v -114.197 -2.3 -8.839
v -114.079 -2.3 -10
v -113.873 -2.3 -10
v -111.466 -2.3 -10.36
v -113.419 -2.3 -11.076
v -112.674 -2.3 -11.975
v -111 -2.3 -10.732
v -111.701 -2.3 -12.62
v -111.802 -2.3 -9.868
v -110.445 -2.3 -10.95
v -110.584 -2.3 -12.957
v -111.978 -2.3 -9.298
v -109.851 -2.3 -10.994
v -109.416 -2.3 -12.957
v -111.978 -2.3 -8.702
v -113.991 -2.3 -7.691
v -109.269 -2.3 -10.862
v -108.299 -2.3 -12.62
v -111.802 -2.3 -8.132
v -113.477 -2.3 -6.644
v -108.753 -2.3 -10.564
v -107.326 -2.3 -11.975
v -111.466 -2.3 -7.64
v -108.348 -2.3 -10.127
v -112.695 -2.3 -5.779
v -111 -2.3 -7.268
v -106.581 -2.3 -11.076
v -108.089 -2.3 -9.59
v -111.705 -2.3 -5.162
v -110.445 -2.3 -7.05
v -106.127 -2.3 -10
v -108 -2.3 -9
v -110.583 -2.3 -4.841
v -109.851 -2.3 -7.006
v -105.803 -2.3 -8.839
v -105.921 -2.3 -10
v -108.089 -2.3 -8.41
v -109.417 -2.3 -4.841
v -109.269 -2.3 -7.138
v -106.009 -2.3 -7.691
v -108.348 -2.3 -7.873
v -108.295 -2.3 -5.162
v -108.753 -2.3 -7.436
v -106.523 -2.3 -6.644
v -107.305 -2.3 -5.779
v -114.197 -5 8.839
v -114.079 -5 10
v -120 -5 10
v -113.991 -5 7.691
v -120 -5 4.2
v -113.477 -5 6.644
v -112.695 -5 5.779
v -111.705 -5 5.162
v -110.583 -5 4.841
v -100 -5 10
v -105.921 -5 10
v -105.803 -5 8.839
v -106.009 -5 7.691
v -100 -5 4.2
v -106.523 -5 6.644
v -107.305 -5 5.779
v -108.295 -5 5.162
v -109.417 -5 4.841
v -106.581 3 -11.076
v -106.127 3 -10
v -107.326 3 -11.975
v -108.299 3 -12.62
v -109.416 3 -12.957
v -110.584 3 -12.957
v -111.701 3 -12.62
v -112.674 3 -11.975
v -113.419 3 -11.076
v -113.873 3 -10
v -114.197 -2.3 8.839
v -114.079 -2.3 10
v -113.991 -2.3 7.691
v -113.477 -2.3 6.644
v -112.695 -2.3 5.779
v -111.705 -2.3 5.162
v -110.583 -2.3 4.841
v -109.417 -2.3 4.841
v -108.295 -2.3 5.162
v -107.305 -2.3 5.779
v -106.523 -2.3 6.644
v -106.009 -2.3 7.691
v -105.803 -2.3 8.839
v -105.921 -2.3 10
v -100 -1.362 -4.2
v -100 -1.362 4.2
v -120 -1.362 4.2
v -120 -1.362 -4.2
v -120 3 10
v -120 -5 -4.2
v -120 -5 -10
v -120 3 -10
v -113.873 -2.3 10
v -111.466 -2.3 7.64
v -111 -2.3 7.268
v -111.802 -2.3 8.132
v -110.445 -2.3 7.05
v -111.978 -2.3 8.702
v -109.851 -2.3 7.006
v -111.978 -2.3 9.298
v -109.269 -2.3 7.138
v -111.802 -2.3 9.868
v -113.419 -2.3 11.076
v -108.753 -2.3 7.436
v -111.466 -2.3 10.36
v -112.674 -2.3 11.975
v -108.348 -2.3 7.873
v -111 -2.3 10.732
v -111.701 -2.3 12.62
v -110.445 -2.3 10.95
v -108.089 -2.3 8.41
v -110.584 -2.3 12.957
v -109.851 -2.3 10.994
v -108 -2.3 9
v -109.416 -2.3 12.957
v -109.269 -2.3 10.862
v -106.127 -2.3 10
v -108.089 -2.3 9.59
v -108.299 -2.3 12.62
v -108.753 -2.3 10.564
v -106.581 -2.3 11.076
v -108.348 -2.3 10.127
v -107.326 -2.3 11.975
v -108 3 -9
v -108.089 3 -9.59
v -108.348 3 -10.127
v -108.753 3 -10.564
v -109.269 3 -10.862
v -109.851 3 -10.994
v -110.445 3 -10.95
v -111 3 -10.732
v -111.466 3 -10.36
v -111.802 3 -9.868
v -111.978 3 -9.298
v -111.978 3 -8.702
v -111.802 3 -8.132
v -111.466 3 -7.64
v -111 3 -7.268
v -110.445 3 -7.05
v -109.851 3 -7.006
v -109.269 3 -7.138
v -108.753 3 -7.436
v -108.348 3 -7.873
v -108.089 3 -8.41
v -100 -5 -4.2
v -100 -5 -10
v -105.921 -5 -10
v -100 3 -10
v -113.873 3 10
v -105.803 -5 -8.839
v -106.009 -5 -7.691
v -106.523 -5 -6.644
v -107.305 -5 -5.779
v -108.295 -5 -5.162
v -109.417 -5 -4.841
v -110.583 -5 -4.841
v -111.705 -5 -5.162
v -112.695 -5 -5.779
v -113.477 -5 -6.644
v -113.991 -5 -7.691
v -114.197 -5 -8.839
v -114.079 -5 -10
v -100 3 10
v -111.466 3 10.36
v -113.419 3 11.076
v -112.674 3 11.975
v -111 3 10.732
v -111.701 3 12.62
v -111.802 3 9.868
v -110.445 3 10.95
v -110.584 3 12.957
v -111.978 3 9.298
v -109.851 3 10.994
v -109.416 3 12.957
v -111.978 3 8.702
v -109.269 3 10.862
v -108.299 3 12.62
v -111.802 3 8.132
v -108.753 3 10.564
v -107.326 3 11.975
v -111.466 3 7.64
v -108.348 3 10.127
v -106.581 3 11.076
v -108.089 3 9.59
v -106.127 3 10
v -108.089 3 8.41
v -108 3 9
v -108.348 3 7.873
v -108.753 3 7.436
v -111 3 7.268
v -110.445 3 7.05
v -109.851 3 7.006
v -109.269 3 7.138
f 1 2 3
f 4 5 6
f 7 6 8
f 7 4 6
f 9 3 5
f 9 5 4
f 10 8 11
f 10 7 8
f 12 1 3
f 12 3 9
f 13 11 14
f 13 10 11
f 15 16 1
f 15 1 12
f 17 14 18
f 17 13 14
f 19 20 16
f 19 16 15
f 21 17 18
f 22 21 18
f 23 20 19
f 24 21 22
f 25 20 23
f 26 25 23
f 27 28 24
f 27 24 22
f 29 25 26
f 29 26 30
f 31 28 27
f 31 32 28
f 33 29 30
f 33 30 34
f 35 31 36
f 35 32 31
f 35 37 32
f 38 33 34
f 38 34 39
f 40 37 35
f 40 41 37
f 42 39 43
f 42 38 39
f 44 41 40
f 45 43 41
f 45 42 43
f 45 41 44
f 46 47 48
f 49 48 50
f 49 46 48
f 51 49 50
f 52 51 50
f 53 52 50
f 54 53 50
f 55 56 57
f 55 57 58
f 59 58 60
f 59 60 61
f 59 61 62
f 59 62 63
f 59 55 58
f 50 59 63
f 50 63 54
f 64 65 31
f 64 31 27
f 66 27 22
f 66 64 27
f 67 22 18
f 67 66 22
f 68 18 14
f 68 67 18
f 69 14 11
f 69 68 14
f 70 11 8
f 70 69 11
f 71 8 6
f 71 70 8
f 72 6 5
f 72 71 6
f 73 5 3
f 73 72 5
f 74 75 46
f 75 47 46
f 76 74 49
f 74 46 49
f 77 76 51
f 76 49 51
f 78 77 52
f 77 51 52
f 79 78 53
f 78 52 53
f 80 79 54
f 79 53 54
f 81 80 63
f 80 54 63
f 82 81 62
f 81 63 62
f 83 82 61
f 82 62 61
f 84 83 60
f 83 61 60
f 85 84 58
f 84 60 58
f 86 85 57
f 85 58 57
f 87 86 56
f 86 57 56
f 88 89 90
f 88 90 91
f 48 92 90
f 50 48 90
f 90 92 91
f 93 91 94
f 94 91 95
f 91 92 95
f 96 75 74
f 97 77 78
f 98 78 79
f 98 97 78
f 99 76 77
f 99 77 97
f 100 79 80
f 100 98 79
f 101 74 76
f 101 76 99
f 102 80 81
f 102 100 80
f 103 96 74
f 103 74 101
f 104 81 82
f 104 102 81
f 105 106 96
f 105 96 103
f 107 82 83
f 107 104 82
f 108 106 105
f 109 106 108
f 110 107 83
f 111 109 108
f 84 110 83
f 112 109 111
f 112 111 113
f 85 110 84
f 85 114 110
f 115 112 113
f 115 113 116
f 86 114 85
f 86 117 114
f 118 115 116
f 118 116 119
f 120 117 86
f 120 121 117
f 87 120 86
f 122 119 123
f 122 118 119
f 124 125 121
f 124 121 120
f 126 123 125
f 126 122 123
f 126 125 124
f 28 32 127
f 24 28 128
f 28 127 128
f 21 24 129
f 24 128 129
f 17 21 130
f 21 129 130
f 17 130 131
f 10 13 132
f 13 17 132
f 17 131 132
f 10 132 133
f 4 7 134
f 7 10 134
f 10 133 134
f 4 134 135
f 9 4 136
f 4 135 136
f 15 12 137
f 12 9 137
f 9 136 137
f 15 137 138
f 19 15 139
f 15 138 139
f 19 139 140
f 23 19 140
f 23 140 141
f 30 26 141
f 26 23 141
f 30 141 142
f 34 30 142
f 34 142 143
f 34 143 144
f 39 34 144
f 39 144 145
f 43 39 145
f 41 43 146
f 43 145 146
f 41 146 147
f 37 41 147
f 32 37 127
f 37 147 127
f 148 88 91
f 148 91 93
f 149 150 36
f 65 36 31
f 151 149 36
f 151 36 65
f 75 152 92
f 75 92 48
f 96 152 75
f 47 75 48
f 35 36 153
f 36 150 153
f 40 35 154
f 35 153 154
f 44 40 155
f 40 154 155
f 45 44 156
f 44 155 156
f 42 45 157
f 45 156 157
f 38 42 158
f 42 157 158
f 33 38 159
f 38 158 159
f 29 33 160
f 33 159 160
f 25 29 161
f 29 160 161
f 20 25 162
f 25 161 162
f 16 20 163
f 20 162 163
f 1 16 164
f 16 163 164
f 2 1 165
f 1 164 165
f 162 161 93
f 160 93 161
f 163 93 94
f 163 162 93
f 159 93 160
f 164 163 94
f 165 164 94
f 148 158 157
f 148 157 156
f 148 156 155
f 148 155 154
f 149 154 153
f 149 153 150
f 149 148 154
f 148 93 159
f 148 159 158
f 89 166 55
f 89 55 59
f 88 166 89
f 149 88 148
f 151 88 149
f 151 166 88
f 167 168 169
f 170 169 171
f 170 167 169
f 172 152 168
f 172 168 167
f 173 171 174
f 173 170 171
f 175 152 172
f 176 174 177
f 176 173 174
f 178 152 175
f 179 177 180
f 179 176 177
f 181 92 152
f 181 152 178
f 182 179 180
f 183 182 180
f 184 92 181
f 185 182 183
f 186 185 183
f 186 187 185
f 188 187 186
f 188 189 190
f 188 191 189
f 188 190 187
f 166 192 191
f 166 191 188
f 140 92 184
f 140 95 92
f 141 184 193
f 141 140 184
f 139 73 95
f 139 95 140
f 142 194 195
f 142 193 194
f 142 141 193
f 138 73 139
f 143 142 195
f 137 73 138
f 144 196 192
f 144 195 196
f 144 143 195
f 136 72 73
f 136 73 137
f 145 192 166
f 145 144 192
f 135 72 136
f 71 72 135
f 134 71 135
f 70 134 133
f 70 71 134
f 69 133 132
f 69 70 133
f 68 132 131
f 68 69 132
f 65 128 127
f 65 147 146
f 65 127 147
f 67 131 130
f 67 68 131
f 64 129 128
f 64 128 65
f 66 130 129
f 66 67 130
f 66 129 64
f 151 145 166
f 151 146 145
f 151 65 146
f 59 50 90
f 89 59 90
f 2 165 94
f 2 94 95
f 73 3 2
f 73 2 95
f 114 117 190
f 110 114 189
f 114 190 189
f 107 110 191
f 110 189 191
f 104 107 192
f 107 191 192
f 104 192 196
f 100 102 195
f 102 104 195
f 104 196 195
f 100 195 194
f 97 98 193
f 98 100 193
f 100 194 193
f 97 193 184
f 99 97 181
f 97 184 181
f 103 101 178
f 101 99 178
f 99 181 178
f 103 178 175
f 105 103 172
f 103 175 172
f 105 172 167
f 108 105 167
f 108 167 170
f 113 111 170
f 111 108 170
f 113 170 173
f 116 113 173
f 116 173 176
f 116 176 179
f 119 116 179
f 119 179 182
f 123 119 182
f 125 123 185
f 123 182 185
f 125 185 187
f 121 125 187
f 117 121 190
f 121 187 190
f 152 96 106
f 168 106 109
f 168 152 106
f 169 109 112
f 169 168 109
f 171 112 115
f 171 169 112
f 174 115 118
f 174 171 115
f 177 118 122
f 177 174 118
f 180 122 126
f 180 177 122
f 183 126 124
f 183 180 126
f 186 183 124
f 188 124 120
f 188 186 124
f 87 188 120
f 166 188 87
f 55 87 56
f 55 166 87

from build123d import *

# Parameters (mm, degrees)
EXTRUDE_1_DEPTH      = 10
EXTRUDE_1_DEPTH_BACK = 10
SKETCH_3_R           = 4
EXTRUDE_2_DEPTH      = 8
SKETCH_2_R           = 2
CUT_EXTRUDE_1_DEPTH  = 10
SKETCH_4_R           = 4.2
SKETCH_4_R_2         = 2
CUT_EXTRUDE_2_DEPTH  = 2.7


with BuildPart() as part:
    # Эскиз1 → Бобышка-Вытянуть1 (new body, two sides)
    with BuildSketch(Plane(origin=(-110, 0, 0), x_dir=(0, 0, -1), z_dir=(1, 0, 0))) as extrude_1_sk:
        Polygon((-4.2, -5), (-4.2, -1.3625), (4.2, -1.3625), (4.2, -5), (10, -5), (10, 3), (-10, 3), (-10, -5), align=None)
    extrude(amount=EXTRUDE_1_DEPTH)
    extrude(extrude_1_sk.sketch, amount=-EXTRUDE_1_DEPTH_BACK)

    # Эскиз3 → Бобышка-Вытянуть2 (add, through all)
    with BuildSketch(Plane(origin=(0, 3, 0), x_dir=(1, 0, 0), z_dir=(0, 1, 0))):
        with Locations((-110, -9)):
            Circle(SKETCH_3_R)
        with Locations((-110, 9)):
            Circle(SKETCH_3_R)
    extrude(amount=-EXTRUDE_2_DEPTH)

    # Эскиз2 → Вырез-Вытянуть1 (cut)
    with BuildSketch(Plane(origin=(0, 3, 0), x_dir=(1, 0, 0), z_dir=(0, 1, 0))):
        with Locations((-110, -9)):
            Circle(SKETCH_2_R)
        with Locations((-110, 9)):
            Circle(SKETCH_2_R)
    extrude(amount=-CUT_EXTRUDE_1_DEPTH, mode=Mode.SUBTRACT)

    # Эскиз4 → Вырез-Вытянуть2 (cut)
    with BuildSketch(Plane.XZ.offset(5)):
        with Locations((-110, 9)):
            Circle(SKETCH_4_R)
        with Locations((-110, 9)):
            Circle(SKETCH_4_R_2, mode=Mode.SUBTRACT)
        with Locations((-110, -9)):
            Circle(SKETCH_4_R)
        with Locations((-110, -9)):
            Circle(SKETCH_4_R_2, mode=Mode.SUBTRACT)
    extrude(amount=-CUT_EXTRUDE_2_DEPTH, mode=Mode.SUBTRACT)


solid = part.part
